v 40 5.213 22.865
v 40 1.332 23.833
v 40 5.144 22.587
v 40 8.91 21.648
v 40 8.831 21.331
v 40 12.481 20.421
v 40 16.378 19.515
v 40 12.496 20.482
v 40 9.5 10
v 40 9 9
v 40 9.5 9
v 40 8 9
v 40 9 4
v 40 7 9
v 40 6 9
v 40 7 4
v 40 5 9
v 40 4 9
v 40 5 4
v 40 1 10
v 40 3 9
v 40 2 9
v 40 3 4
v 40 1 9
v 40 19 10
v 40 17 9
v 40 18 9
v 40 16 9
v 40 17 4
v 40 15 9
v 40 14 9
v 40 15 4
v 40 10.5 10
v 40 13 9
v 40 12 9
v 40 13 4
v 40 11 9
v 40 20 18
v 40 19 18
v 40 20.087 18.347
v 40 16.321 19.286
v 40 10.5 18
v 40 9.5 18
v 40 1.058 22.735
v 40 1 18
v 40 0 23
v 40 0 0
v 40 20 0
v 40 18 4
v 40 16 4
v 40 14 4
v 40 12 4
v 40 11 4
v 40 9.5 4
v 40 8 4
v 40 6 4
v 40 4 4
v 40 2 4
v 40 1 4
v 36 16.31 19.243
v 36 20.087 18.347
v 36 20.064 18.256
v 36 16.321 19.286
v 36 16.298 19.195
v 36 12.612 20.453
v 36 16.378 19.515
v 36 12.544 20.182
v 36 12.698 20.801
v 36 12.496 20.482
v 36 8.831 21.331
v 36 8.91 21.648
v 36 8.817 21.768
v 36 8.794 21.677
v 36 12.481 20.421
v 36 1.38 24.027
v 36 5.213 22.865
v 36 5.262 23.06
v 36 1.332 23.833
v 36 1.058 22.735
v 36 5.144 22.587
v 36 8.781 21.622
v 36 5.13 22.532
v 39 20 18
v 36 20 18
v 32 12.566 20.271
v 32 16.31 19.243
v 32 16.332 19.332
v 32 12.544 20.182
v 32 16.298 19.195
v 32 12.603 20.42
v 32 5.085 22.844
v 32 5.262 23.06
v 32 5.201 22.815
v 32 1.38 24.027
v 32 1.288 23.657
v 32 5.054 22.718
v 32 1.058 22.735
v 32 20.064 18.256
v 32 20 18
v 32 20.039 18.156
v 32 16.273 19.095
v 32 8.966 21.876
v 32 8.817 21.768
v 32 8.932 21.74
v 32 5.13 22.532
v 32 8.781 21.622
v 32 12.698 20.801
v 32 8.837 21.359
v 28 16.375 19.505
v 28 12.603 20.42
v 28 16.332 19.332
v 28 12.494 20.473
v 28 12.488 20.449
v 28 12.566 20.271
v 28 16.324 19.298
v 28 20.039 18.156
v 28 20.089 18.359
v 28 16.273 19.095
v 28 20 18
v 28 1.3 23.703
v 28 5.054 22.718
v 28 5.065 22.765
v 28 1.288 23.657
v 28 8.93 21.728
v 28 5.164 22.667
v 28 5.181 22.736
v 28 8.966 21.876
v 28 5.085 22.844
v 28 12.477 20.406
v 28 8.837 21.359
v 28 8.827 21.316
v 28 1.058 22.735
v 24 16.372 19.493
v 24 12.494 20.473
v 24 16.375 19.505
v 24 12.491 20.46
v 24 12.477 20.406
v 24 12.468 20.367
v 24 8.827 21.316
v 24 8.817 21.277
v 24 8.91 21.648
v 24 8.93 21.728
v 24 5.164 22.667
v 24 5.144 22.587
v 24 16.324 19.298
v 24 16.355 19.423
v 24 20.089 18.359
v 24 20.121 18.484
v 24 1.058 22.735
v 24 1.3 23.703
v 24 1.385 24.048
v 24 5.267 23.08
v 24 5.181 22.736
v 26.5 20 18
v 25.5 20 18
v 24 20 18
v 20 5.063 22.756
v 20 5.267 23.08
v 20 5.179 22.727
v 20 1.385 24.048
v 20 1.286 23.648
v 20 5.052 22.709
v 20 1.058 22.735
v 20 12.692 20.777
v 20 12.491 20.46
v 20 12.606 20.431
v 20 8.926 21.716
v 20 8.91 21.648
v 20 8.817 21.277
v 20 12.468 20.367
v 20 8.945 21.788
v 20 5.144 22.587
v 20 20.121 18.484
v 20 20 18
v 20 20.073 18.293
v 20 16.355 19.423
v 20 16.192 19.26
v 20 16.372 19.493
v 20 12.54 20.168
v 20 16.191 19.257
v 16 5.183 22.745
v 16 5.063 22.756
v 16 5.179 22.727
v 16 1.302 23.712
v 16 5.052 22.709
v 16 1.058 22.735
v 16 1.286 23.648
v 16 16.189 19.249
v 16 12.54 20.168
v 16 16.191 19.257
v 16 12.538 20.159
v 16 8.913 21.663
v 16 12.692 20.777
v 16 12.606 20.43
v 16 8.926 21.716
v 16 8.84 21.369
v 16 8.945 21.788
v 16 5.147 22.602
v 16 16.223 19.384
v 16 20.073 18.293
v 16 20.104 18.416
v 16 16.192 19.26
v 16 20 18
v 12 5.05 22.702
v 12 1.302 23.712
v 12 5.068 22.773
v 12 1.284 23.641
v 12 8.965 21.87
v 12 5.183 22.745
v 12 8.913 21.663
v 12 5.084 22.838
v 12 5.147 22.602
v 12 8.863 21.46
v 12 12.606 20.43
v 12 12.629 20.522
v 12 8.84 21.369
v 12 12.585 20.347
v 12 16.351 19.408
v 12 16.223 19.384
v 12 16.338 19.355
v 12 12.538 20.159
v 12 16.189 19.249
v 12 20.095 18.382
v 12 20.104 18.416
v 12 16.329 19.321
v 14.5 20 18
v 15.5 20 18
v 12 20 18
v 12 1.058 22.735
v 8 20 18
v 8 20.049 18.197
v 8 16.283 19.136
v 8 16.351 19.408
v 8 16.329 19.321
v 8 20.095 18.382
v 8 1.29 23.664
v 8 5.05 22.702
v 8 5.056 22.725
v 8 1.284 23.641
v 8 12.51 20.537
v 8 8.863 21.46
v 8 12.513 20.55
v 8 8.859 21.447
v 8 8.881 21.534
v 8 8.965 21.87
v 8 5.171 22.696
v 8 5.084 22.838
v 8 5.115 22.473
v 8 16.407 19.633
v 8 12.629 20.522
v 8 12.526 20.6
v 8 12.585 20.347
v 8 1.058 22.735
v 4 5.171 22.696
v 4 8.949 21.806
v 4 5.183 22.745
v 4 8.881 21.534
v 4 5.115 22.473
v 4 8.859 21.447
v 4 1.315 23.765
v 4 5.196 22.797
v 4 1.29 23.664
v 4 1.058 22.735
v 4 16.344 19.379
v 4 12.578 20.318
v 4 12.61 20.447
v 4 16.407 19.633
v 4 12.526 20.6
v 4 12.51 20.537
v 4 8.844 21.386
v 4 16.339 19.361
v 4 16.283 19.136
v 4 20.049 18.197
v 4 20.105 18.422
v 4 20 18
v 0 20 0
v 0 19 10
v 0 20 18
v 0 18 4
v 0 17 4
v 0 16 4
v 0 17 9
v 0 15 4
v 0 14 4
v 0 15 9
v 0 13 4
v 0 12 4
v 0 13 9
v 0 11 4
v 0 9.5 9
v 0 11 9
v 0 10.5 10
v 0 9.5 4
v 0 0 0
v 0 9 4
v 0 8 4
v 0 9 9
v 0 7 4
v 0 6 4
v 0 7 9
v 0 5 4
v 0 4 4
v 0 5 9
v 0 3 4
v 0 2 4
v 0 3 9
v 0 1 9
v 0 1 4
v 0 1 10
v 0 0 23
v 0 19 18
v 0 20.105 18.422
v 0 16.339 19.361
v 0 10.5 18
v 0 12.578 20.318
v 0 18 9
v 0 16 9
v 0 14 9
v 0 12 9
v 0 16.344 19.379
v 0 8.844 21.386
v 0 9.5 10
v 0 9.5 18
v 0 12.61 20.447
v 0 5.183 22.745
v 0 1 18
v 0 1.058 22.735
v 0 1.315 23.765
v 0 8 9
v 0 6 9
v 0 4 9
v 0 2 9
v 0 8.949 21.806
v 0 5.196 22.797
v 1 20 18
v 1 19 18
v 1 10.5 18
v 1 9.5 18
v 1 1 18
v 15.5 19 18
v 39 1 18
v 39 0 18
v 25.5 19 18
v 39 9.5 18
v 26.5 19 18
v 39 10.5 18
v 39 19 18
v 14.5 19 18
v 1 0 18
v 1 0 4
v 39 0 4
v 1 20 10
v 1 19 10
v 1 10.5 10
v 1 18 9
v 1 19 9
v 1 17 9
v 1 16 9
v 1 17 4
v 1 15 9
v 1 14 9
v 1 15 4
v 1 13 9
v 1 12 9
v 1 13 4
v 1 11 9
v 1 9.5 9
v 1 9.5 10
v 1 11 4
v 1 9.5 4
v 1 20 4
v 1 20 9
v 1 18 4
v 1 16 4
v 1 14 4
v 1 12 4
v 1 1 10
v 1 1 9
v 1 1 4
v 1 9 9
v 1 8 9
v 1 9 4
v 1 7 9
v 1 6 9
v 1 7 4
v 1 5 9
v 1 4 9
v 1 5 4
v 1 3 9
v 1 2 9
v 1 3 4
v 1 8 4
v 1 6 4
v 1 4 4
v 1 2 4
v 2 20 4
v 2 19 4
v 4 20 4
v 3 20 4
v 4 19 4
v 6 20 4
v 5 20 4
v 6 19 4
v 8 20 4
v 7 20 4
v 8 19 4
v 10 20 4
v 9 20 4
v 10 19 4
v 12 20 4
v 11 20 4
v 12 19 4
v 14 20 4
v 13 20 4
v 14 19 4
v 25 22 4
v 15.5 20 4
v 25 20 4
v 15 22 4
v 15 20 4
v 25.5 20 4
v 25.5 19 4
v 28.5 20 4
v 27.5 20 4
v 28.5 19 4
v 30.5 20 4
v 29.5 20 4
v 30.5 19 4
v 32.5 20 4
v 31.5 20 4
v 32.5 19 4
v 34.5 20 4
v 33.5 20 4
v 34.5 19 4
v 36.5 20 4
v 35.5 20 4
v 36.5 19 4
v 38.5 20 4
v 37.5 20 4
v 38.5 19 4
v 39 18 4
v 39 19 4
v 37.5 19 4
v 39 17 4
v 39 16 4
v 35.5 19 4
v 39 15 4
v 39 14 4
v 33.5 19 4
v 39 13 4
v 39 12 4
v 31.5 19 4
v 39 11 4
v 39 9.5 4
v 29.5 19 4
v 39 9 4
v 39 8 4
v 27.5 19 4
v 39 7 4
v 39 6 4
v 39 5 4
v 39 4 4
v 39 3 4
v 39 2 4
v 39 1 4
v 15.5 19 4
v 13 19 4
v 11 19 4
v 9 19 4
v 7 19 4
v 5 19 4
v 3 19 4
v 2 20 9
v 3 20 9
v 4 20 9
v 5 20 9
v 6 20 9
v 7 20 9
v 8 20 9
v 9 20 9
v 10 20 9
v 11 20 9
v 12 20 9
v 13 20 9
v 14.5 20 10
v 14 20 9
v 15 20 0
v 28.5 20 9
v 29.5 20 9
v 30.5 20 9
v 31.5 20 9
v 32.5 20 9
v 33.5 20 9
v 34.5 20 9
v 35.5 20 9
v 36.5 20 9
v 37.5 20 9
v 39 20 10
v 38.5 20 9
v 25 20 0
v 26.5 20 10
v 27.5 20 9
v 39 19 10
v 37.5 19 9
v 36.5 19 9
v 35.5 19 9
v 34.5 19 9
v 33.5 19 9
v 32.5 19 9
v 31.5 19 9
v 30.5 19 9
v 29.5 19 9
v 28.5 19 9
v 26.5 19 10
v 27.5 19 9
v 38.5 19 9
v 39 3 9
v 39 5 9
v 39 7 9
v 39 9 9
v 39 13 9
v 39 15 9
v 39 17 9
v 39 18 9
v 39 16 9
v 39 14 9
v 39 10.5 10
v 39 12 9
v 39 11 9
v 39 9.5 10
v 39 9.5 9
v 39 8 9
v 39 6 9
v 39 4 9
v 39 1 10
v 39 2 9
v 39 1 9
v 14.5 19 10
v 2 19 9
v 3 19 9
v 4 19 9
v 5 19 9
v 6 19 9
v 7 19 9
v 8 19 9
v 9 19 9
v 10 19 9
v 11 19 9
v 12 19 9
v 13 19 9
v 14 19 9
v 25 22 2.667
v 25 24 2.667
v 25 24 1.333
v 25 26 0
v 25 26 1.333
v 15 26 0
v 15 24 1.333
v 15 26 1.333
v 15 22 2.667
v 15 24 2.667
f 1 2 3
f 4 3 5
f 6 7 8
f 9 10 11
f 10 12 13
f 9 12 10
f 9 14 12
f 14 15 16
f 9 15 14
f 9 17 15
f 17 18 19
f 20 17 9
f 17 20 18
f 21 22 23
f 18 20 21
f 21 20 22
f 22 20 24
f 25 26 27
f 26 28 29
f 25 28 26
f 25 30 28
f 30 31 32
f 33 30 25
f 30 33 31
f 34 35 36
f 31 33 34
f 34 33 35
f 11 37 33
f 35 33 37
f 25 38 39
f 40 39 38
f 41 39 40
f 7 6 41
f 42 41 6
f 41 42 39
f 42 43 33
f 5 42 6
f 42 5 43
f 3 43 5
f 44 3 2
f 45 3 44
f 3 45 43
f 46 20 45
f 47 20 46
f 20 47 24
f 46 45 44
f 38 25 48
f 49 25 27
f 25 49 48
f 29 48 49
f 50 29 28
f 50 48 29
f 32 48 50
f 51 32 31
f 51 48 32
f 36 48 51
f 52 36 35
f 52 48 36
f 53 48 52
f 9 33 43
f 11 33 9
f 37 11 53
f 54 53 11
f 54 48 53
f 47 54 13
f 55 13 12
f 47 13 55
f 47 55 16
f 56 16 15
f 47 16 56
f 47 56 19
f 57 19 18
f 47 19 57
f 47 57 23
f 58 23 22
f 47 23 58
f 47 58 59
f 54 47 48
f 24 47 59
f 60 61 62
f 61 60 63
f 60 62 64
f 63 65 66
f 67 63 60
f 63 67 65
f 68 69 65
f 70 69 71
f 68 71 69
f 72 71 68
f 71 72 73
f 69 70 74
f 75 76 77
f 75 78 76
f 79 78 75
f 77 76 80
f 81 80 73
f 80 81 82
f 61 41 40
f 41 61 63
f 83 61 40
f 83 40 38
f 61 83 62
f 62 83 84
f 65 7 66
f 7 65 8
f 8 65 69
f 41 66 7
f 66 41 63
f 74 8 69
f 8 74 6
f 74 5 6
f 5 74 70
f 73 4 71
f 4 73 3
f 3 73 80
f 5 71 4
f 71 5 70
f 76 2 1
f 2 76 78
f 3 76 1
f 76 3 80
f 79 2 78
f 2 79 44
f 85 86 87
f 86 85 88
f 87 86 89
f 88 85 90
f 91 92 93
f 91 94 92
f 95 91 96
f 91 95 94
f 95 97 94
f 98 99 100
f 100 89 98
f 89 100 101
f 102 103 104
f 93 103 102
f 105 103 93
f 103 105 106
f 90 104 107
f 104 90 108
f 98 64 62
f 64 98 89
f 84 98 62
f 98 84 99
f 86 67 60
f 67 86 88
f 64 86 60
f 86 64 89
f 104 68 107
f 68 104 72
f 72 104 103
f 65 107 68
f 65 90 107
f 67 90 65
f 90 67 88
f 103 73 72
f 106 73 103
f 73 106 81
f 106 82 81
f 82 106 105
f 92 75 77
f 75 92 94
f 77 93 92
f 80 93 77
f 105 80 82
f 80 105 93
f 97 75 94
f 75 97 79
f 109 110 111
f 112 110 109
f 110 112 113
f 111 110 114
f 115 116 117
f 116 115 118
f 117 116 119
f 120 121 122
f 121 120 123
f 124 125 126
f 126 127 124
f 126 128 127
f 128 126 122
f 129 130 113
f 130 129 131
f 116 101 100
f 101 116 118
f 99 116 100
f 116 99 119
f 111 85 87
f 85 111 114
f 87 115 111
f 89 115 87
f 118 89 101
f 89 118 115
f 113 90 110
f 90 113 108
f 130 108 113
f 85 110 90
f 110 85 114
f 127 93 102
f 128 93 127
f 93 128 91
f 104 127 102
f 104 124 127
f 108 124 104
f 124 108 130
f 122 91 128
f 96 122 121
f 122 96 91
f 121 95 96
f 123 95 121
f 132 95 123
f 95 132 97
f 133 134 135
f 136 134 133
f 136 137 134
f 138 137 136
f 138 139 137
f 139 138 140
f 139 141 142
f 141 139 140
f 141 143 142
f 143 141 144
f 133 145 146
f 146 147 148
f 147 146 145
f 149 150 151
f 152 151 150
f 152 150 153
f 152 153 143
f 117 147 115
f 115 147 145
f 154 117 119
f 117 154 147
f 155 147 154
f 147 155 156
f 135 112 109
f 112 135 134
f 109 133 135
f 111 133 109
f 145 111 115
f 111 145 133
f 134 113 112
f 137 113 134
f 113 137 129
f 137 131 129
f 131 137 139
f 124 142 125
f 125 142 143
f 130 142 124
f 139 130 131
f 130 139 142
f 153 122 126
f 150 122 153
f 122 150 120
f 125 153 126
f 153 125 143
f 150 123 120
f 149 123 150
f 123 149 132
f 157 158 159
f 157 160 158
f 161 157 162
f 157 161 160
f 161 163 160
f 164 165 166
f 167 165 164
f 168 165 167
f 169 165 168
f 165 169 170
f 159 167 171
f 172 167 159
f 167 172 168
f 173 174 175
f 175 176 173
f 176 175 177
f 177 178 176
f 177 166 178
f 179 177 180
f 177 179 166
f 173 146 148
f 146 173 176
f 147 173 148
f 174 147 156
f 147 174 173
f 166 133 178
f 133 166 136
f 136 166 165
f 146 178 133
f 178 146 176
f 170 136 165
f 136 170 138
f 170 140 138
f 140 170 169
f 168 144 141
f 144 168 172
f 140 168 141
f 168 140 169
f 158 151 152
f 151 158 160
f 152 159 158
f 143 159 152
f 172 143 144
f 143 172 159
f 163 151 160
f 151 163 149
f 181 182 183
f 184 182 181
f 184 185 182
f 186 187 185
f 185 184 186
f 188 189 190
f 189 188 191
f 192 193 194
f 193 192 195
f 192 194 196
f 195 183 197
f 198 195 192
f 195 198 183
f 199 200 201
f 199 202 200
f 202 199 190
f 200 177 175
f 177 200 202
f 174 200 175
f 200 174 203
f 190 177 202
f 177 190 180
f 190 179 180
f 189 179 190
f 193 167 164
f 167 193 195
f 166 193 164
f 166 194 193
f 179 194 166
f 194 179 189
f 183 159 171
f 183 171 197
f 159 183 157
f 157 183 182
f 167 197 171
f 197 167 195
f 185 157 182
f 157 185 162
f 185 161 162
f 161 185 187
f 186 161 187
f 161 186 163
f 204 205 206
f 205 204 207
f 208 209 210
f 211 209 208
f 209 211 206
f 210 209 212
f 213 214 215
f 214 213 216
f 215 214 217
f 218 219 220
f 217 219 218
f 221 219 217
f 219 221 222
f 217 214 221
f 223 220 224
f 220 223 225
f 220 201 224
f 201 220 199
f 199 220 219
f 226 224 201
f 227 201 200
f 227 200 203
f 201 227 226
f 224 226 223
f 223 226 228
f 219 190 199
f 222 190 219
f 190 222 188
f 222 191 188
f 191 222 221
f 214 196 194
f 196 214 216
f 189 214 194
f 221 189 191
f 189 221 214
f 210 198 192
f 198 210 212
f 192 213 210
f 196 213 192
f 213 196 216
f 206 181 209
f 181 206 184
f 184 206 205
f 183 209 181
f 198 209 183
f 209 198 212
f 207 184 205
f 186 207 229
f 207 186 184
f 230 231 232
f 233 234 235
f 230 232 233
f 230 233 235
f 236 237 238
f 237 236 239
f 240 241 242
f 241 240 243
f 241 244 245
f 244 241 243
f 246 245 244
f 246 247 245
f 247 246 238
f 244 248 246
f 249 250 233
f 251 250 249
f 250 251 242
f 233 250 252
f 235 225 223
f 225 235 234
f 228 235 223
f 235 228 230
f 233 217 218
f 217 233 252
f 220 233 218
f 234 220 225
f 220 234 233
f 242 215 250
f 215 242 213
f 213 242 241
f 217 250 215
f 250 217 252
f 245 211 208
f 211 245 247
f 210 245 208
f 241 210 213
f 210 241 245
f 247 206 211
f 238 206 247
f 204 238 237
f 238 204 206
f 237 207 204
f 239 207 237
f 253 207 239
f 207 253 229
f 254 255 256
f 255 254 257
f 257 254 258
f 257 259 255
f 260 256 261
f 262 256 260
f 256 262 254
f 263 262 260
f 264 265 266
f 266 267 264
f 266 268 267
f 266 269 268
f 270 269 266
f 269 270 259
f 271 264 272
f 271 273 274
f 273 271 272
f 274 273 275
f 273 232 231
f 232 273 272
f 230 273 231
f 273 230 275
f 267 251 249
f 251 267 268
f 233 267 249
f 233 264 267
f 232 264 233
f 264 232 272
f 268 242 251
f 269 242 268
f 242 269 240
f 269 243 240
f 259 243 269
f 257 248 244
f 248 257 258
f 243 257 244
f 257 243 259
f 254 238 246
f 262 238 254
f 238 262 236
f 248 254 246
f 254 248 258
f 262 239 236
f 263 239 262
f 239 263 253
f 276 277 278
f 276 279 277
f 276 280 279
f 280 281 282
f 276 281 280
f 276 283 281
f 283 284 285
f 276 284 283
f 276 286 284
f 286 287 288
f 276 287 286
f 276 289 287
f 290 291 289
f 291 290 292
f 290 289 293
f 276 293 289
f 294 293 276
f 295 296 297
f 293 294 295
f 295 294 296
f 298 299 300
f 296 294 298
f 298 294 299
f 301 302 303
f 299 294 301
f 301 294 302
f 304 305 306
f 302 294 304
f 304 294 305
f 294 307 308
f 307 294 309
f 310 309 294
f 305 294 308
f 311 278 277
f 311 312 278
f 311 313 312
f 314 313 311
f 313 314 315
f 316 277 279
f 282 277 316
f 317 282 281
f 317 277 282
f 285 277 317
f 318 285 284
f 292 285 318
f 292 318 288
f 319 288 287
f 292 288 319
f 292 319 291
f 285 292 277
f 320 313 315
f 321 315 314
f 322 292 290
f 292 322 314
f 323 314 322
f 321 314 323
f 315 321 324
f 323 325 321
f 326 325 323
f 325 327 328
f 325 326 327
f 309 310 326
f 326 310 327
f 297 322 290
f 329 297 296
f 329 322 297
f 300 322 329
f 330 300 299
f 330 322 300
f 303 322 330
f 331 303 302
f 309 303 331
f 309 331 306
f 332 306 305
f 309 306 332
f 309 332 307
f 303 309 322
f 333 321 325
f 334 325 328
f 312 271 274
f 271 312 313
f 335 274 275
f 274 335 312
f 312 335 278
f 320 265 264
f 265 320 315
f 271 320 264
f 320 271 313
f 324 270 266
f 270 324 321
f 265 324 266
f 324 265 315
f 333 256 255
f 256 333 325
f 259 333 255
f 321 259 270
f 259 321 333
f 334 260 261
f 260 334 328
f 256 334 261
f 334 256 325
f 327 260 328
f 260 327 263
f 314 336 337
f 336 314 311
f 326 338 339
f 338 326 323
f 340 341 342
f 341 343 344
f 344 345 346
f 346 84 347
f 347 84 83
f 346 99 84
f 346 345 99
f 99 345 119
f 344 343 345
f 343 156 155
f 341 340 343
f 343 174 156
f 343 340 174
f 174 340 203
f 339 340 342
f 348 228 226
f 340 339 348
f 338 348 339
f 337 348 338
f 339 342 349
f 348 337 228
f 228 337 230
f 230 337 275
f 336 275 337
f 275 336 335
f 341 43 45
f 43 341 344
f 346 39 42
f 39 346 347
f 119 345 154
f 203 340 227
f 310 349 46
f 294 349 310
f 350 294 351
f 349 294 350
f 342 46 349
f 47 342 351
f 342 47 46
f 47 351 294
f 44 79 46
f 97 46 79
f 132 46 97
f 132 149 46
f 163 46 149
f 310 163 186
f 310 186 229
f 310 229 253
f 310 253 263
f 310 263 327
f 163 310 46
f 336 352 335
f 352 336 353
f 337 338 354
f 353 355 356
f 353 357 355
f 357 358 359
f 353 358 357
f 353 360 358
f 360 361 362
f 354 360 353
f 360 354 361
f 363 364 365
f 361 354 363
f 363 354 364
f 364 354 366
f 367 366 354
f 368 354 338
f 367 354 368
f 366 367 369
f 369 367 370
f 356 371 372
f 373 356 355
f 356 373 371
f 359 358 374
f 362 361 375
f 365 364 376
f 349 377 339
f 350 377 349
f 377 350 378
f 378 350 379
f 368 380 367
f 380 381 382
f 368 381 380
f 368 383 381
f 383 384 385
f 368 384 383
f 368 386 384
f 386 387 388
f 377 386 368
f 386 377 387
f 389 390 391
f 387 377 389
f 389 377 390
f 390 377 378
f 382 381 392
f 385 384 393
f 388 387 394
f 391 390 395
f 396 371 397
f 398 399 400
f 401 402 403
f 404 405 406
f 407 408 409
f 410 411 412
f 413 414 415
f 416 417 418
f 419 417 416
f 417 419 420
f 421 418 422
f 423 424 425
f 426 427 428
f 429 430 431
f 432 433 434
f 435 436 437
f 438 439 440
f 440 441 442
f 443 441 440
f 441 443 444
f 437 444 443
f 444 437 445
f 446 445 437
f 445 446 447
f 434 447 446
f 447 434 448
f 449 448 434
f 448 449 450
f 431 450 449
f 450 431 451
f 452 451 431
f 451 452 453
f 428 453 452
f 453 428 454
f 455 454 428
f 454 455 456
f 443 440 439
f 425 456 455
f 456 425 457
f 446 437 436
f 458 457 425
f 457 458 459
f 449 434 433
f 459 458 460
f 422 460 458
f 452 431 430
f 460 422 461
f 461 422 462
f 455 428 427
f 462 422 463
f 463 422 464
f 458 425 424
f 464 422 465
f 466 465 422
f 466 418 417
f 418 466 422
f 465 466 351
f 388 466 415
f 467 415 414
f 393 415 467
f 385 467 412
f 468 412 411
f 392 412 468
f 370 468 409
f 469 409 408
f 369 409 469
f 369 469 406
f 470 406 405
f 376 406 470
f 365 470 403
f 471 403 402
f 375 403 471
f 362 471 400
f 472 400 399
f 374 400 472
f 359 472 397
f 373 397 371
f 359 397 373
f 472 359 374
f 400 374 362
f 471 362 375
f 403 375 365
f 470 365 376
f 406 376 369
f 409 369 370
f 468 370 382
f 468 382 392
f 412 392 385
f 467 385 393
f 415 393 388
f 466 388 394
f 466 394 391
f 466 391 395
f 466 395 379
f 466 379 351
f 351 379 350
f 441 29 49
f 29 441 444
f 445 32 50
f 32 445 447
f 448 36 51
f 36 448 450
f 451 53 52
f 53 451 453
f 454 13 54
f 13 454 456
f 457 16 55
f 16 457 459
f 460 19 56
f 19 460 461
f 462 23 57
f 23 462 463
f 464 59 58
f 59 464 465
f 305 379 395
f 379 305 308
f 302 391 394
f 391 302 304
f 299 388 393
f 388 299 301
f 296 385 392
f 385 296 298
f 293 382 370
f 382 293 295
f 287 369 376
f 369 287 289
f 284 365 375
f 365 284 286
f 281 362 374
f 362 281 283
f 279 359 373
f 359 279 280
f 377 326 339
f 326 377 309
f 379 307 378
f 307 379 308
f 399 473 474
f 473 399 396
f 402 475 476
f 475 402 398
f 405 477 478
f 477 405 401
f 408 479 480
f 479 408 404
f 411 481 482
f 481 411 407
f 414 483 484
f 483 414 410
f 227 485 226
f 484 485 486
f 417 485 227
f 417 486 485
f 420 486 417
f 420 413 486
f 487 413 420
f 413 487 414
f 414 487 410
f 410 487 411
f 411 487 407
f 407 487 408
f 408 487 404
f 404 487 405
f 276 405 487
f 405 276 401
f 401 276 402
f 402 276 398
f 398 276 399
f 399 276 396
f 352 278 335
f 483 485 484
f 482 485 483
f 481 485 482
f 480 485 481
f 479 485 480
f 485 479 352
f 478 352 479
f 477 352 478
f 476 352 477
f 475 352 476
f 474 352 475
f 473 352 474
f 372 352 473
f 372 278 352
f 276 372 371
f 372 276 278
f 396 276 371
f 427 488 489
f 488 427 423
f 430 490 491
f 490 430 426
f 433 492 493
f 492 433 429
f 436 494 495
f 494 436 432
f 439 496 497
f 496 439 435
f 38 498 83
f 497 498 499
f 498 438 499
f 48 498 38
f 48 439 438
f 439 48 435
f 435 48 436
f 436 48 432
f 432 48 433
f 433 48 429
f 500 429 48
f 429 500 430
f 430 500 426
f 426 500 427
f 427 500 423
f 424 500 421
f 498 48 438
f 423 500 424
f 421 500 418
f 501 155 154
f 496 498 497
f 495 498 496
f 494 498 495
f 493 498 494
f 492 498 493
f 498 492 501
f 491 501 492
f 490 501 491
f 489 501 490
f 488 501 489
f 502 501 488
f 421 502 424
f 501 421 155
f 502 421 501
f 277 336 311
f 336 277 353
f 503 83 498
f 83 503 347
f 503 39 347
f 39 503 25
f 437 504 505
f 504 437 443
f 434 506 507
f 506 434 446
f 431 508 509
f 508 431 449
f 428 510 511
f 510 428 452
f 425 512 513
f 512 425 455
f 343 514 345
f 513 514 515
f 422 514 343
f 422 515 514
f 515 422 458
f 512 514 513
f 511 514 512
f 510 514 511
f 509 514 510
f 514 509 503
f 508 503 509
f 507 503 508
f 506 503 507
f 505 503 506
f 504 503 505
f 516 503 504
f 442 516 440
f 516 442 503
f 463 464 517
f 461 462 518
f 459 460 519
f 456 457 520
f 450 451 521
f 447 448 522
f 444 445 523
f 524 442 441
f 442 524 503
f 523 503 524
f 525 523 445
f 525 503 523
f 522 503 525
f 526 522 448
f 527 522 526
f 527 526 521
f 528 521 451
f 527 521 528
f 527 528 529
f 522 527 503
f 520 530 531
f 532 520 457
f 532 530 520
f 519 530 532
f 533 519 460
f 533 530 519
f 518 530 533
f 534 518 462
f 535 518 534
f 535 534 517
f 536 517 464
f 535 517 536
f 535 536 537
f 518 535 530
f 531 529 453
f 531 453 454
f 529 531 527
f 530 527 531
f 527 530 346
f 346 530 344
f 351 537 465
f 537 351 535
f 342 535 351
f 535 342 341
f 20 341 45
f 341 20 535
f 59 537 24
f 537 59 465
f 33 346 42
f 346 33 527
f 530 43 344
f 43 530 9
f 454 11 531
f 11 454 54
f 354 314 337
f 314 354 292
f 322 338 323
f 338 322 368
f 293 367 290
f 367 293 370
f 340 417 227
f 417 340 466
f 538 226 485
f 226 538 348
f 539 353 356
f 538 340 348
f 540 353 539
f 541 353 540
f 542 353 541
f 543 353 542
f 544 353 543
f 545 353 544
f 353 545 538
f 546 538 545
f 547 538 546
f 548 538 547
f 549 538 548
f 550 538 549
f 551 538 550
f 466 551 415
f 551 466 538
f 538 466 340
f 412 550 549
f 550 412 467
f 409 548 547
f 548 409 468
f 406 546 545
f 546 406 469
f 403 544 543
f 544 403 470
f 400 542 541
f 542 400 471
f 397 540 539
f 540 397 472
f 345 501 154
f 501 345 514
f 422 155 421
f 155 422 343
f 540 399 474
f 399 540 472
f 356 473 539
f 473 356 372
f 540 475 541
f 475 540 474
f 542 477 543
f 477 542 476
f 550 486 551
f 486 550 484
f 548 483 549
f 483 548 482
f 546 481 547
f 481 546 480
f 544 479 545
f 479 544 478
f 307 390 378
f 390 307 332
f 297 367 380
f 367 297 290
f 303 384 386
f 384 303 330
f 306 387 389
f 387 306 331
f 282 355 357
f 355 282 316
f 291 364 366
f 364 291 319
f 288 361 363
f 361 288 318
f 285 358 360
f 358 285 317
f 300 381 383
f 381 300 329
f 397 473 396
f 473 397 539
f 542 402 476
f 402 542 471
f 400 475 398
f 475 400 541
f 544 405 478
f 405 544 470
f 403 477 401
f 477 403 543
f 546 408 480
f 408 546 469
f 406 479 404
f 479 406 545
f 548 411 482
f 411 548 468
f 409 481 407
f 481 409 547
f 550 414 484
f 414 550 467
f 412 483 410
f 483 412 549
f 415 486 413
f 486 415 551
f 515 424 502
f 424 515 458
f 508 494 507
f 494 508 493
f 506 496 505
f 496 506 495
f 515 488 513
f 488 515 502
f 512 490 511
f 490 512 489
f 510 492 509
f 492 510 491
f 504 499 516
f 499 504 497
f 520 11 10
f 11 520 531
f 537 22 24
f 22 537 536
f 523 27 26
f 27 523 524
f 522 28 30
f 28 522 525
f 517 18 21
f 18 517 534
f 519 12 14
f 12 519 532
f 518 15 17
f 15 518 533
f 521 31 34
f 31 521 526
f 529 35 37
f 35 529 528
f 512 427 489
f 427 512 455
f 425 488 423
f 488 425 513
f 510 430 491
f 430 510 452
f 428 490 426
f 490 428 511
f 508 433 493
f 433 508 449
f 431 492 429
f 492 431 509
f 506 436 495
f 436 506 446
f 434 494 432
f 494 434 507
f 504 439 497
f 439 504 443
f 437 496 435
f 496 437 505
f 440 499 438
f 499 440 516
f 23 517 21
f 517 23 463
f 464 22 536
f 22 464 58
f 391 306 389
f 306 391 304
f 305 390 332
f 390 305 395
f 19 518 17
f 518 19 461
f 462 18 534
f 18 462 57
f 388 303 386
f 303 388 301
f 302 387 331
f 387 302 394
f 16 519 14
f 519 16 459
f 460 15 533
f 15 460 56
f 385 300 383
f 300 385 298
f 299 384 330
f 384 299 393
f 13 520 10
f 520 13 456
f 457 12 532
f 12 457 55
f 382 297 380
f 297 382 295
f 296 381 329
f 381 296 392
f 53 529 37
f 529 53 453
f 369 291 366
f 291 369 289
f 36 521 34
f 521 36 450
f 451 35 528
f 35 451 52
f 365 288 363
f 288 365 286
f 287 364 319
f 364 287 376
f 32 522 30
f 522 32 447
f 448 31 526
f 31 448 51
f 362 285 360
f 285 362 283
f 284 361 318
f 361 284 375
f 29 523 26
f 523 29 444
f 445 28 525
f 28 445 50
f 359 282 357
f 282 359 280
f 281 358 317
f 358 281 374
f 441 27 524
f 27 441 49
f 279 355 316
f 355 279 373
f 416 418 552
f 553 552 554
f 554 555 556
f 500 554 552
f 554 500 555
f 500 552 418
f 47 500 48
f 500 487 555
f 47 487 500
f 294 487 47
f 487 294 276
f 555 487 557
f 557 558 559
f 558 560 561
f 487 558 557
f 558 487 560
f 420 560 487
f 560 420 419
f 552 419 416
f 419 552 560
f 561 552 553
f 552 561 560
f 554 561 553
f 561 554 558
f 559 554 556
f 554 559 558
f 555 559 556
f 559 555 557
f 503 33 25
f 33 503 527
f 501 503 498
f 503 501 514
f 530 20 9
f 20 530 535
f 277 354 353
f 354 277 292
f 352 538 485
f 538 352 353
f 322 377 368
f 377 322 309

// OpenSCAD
// Porch and Roof
// © 2018 William Barkoff

cube([40, 20, 4]); //porch floor

translate([40,20,18]) {
    rotate([0,0,180]) {
        roof();    
    }
}

//translate([50, 0, 0]) 
//    roof();


postPositions = [
    [0,0,0],
    [0, 19, 0],
    [39, 19, 0],
    [39, 0, 0],
    [39, 9.5, 0],
    [0, 9.5, 0],
    [14.5, 19, 0],
    [25.5, 19, 0]
];

halfPostPositions = [
    [0,0,0],
    [0, 19, 0],
    [39, 19, 0],
    [39, 0, 0],
    [39, 9.5, 0],
    [0, 9.5, 0],
    [14.5, 19, 0],
    [25.5, 19, 0]
];

for (position = postPositions) {
    translate(position) {
        post();
    }
}

translate([39,0,9]) {
    cube([1, 20, 1]);
}
translate([0,0,9]) {
    cube([1, 20, 1]);
}

translate([0, 19, 9]) {
    cube([15,1,1]);
}

translate([26, 19, 9]) {
    cube([14,1,1]);
}

for(a = [0:2:15]) {
    translate([a, 19, 0]){
        halfPost();
    }
}

for(a = [26.5:2:39]) {
    translate([a, 19, 0]){
        halfPost();
    }
}

for(a = [0:2:19]) {
    translate([39, a, 0]){
        halfPost();
    }
    translate([0, a, 0]){
        halfPost();
    }
}

translate([15, 20, 0]){
    cube([10, 2, 4]);
    translate([0, 2, 0]) {
        cube([10, 2, (2/3)*4]);
    }
    translate([0,4,0]){
        cube([10, 2, (1/3)*4]);
    }
}

module post() {
    translate([0,0,4]) {
        cube([1, 1, 14]);
    }
}

module roof(l, w, h){
    triangularPrisim(40, 20, 5);
    for(x=[0:4:36]) {
        translate([x, 0, 0]) {
            rotate([14, 0, 0]) {
                cube([4,4, rands(0,0.5,1)[0]]);
            }
        }
        translate([x, 4, 0]) {
            rotate([14, 0, 0]) {
                cube([4,4, rands(1.2,1.7,1)[0]]);
            }
        }
        translate([x, 8, 0]) {
            rotate([14, 0, 0]) {
                cube([4,4, rands(2.4,2.9,1)[0]]);
            }
        }
        translate([x, 12, 0]) {
            rotate([14, 0, 0]) {
                cube([4,4, rands(3.6,4.1,1)[0]]);
            }
        }
        translate([x, 16, 0]) {
            rotate([14, 0, 0]) {
                cube([4,4, rands(4.8,5.3,1)[0]]);
            }
        }
    }
}

module triangularPrisim(l, w, h) {
    polyhedron(
        points=[[0,0,0], [l,0,0], [l,w,0], [0,w,0], [0,w,h], [l,w,h]],
        faces=[[0,1,2,3],[5,4,3,2],[0,4,5,1],[0,3,4],[5,2,1]]
    );
}

module halfPost() {
    translate([0,0,4]) {
        cube([1,1,5]);
    }
}
